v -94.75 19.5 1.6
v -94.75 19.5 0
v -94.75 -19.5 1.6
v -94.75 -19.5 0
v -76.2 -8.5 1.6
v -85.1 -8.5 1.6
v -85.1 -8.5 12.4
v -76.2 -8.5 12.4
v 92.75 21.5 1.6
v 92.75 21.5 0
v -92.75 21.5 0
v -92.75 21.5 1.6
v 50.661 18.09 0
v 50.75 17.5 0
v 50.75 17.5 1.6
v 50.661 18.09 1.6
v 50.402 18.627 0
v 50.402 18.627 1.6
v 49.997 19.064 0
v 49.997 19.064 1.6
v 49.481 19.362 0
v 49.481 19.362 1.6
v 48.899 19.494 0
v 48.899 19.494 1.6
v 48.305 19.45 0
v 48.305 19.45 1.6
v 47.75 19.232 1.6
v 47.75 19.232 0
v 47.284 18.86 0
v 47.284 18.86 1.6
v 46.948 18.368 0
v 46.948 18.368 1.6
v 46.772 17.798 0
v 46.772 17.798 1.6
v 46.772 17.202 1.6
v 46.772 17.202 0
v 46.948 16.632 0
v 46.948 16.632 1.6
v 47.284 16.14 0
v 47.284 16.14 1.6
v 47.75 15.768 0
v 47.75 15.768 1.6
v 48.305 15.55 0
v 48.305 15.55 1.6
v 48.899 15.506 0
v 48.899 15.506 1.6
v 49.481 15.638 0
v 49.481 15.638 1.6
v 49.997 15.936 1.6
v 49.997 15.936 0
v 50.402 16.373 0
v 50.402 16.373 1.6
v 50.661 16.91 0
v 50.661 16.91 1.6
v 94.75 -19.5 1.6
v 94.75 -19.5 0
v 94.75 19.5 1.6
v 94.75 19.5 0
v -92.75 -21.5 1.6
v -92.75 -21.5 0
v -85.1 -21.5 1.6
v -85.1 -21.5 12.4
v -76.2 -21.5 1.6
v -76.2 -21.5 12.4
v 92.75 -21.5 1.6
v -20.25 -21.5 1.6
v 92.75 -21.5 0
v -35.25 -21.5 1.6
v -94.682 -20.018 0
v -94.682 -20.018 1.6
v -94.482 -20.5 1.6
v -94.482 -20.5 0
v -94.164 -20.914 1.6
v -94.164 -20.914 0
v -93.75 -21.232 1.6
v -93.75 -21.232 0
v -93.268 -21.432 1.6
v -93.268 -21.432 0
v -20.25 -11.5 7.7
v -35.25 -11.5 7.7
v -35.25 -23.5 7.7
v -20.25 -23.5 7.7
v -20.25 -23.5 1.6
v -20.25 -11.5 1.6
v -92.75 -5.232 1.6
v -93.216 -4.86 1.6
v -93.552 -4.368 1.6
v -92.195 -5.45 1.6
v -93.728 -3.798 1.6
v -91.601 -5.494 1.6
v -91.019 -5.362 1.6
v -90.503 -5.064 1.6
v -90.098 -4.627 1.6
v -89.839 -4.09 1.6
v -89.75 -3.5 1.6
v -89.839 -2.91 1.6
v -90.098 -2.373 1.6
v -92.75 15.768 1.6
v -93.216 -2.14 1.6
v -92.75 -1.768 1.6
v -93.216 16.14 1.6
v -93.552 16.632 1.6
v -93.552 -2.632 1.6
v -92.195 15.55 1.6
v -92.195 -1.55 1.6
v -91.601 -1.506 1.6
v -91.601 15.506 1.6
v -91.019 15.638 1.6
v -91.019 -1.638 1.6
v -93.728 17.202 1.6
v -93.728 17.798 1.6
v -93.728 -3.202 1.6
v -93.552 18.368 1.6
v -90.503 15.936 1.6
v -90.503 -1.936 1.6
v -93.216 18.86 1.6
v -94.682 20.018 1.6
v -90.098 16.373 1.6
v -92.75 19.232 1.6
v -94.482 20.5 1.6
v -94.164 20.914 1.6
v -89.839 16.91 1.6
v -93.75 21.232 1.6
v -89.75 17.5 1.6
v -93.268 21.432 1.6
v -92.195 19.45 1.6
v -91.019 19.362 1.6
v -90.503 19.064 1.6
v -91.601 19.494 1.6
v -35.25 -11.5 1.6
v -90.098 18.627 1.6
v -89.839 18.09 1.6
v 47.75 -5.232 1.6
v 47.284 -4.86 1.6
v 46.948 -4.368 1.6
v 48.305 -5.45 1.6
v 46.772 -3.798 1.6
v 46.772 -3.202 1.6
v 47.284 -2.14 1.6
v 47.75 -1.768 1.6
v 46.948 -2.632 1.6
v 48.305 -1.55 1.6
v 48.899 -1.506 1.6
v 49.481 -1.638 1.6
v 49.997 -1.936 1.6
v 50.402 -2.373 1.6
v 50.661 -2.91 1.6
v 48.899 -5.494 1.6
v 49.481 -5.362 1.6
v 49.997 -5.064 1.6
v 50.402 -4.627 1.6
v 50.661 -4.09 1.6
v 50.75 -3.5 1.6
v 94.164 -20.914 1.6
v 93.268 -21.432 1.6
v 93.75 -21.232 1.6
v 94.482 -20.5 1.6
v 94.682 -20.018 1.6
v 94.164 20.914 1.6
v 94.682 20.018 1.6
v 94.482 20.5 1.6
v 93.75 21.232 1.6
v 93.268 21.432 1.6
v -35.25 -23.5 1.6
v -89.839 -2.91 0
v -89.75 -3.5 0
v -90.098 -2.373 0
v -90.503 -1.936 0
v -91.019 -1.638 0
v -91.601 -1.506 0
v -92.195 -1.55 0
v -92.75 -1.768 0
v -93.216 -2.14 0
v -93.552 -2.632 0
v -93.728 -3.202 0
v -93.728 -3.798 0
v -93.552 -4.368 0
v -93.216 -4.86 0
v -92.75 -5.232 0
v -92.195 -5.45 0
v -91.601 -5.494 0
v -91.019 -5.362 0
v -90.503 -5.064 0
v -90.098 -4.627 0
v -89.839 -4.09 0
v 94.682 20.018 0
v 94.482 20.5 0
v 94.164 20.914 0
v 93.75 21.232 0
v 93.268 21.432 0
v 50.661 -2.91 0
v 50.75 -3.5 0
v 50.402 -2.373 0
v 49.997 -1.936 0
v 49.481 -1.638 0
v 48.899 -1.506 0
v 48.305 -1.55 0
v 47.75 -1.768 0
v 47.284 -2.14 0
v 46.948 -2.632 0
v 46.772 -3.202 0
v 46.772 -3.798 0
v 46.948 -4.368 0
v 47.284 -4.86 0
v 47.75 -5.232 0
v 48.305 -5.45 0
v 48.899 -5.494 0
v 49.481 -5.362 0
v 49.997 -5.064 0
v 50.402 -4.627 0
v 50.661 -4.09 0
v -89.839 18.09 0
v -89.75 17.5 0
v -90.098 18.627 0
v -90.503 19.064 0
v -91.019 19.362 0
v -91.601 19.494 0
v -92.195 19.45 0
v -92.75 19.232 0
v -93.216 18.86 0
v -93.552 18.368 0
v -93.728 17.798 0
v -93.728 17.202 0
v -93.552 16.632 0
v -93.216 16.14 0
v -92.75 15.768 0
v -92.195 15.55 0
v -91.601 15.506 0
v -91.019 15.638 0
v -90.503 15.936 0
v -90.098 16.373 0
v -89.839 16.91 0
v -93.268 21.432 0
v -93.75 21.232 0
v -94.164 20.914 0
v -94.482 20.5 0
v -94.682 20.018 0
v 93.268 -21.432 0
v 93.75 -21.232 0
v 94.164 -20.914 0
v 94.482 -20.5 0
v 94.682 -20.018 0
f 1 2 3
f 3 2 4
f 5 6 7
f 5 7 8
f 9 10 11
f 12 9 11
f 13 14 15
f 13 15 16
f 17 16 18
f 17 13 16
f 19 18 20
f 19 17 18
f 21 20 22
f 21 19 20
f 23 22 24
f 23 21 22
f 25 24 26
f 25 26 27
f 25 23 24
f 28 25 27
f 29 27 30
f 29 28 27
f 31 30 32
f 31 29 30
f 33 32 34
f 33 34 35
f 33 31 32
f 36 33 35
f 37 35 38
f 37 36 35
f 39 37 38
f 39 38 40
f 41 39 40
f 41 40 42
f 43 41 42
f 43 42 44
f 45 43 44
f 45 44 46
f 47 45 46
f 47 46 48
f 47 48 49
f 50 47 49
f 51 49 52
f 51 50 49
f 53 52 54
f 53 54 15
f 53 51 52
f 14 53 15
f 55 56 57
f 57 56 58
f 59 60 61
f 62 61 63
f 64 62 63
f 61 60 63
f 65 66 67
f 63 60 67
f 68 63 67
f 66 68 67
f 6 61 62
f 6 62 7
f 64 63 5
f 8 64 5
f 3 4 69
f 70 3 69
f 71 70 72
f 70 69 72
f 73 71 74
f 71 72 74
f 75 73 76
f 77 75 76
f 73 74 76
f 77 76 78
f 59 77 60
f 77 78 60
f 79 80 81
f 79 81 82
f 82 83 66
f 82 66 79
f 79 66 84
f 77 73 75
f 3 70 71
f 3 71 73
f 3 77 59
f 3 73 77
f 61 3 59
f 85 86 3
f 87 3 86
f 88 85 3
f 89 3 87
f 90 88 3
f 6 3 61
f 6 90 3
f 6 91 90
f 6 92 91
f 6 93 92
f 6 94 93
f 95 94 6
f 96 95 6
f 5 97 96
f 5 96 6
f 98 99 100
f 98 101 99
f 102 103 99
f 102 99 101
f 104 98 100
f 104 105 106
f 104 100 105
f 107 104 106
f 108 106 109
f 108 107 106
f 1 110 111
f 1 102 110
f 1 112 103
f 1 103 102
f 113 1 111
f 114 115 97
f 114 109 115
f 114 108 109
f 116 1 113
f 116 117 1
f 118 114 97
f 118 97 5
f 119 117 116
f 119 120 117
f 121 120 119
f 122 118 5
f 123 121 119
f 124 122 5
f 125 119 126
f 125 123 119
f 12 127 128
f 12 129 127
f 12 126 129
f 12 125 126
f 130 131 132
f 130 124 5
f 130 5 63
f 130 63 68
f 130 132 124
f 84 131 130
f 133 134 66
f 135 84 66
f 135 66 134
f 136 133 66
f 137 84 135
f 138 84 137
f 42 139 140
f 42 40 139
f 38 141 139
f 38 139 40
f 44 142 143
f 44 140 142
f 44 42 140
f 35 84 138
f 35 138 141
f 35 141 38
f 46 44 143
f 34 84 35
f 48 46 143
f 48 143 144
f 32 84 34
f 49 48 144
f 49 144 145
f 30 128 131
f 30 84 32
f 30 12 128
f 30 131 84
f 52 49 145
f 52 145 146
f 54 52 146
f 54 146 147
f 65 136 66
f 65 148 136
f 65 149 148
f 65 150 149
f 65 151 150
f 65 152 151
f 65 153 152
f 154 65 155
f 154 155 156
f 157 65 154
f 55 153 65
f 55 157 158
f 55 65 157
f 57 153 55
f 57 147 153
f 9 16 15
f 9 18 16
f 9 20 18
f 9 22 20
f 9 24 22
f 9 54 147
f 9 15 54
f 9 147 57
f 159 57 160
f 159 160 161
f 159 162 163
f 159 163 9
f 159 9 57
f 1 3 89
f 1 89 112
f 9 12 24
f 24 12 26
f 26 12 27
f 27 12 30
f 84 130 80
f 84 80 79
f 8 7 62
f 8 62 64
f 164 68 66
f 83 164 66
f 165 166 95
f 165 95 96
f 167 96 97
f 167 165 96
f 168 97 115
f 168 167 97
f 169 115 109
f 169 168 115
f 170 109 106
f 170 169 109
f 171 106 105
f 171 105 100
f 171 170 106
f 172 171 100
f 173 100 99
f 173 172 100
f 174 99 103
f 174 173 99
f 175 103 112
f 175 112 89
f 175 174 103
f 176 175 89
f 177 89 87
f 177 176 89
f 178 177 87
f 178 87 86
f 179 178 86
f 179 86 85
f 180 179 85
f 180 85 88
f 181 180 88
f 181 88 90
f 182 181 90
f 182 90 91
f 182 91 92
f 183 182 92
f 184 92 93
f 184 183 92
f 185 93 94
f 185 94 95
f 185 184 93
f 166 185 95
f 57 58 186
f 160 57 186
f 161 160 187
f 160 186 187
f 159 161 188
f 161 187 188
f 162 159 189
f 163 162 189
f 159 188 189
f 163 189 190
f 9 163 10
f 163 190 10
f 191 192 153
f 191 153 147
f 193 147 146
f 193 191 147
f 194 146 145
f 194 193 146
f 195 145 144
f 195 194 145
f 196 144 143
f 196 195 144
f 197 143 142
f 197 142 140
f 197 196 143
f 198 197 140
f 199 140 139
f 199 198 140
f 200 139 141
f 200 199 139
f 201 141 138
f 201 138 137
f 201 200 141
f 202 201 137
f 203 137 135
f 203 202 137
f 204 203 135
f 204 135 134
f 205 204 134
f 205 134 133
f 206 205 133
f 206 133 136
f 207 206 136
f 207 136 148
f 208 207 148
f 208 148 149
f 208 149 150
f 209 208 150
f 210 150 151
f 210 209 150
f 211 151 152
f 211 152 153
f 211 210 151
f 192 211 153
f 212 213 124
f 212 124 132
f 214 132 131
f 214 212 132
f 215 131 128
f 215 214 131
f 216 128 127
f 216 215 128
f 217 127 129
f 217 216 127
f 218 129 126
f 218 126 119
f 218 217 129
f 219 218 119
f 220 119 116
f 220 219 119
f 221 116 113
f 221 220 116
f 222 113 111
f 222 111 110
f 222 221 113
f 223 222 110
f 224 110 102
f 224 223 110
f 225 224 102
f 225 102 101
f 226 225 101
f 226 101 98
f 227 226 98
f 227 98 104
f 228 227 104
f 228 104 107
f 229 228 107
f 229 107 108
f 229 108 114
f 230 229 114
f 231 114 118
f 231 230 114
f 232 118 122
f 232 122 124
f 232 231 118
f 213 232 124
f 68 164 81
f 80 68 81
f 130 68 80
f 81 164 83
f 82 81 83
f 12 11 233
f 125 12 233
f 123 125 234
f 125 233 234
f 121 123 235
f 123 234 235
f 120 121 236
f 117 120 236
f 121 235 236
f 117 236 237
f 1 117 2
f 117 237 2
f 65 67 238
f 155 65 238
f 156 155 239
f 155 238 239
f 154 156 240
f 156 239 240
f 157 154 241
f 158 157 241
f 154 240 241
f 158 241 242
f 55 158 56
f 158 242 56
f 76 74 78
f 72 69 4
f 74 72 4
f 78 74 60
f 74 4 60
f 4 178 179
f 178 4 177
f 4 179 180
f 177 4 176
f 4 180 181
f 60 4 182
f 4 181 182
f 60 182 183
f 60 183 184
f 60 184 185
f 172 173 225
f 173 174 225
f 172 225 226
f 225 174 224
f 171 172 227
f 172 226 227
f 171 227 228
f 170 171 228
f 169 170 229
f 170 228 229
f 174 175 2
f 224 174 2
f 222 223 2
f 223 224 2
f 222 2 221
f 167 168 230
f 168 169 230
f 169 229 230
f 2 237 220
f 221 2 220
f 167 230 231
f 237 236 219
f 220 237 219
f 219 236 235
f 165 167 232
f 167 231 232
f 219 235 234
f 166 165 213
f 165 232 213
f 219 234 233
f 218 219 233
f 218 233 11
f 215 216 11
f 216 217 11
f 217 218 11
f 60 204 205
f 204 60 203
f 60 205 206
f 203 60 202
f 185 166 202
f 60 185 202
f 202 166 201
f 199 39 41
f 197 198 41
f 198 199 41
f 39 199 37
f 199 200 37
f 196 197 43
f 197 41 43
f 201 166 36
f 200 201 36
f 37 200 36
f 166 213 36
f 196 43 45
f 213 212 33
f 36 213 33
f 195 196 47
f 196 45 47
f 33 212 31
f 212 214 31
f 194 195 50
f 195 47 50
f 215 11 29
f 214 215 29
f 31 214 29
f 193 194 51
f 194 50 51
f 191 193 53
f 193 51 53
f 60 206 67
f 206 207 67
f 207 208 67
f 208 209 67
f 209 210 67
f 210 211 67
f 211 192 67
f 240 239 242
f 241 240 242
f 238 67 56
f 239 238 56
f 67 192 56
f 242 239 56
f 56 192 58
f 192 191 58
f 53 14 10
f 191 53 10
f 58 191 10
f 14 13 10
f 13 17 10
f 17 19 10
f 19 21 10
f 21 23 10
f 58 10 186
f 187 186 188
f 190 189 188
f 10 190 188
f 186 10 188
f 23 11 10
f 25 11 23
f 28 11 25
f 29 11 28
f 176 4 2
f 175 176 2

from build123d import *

# Parameters (mm, degrees)
F0_R     = 2
F1_DEPTH = 1.6
F2_W     = 8.9
F2_H     = 13
F3_DEPTH = 10.8
F4_W     = 15
F4_H     = 12
F5_DEPTH = 6.1


with BuildPart() as f1:
    # F0 (on Top) → F1 (new body)
    with BuildSketch(Plane.XY):
        with BuildLine():
            Line((-92.75, -21.5), (92.75, -21.5))
            ThreePointArc((92.75, -21.5), (94.164214, -20.914214), (94.75, -19.5))
            Line((94.75, -19.5), (94.75, 19.5))
            ThreePointArc((94.75, 19.5), (94.164214, 20.914214), (92.75, 21.5))
            Line((92.75, 21.5), (-92.75, 21.5))
            ThreePointArc((-92.75, 21.5), (-94.164214, 20.914214), (-94.75, 19.5))
            Line((-94.75, 19.5), (-94.75, -19.5))
            ThreePointArc((-94.75, -19.5), (-94.164214, -20.914214), (-92.75, -21.5))
        make_face()
        with Locations((-91.75, -3.5)):
            Circle(F0_R, mode=Mode.SUBTRACT)
        with Locations((48.75, -3.5)):
            Circle(F0_R, mode=Mode.SUBTRACT)
        with Locations((-91.75, 17.5)):
            Circle(F0_R, mode=Mode.SUBTRACT)
        with Locations((48.75, 17.5)):
            Circle(F0_R, mode=Mode.SUBTRACT)
    extrude(amount=F1_DEPTH)

    # F2 (on face) → F3 (join)
    with BuildSketch(Plane.XY.offset(1.6)):
        with Locations((-80.65, -15)):
            Rectangle(F2_W, F2_H)
    extrude(amount=F3_DEPTH)

    # F4 (on face) → F5 (join)
    with BuildSketch(Plane.XY.offset(1.6)):
        with Locations((-27.75, -17.5)):
            Rectangle(F4_W, F4_H)
    extrude(amount=F5_DEPTH)


solid = f1.part
